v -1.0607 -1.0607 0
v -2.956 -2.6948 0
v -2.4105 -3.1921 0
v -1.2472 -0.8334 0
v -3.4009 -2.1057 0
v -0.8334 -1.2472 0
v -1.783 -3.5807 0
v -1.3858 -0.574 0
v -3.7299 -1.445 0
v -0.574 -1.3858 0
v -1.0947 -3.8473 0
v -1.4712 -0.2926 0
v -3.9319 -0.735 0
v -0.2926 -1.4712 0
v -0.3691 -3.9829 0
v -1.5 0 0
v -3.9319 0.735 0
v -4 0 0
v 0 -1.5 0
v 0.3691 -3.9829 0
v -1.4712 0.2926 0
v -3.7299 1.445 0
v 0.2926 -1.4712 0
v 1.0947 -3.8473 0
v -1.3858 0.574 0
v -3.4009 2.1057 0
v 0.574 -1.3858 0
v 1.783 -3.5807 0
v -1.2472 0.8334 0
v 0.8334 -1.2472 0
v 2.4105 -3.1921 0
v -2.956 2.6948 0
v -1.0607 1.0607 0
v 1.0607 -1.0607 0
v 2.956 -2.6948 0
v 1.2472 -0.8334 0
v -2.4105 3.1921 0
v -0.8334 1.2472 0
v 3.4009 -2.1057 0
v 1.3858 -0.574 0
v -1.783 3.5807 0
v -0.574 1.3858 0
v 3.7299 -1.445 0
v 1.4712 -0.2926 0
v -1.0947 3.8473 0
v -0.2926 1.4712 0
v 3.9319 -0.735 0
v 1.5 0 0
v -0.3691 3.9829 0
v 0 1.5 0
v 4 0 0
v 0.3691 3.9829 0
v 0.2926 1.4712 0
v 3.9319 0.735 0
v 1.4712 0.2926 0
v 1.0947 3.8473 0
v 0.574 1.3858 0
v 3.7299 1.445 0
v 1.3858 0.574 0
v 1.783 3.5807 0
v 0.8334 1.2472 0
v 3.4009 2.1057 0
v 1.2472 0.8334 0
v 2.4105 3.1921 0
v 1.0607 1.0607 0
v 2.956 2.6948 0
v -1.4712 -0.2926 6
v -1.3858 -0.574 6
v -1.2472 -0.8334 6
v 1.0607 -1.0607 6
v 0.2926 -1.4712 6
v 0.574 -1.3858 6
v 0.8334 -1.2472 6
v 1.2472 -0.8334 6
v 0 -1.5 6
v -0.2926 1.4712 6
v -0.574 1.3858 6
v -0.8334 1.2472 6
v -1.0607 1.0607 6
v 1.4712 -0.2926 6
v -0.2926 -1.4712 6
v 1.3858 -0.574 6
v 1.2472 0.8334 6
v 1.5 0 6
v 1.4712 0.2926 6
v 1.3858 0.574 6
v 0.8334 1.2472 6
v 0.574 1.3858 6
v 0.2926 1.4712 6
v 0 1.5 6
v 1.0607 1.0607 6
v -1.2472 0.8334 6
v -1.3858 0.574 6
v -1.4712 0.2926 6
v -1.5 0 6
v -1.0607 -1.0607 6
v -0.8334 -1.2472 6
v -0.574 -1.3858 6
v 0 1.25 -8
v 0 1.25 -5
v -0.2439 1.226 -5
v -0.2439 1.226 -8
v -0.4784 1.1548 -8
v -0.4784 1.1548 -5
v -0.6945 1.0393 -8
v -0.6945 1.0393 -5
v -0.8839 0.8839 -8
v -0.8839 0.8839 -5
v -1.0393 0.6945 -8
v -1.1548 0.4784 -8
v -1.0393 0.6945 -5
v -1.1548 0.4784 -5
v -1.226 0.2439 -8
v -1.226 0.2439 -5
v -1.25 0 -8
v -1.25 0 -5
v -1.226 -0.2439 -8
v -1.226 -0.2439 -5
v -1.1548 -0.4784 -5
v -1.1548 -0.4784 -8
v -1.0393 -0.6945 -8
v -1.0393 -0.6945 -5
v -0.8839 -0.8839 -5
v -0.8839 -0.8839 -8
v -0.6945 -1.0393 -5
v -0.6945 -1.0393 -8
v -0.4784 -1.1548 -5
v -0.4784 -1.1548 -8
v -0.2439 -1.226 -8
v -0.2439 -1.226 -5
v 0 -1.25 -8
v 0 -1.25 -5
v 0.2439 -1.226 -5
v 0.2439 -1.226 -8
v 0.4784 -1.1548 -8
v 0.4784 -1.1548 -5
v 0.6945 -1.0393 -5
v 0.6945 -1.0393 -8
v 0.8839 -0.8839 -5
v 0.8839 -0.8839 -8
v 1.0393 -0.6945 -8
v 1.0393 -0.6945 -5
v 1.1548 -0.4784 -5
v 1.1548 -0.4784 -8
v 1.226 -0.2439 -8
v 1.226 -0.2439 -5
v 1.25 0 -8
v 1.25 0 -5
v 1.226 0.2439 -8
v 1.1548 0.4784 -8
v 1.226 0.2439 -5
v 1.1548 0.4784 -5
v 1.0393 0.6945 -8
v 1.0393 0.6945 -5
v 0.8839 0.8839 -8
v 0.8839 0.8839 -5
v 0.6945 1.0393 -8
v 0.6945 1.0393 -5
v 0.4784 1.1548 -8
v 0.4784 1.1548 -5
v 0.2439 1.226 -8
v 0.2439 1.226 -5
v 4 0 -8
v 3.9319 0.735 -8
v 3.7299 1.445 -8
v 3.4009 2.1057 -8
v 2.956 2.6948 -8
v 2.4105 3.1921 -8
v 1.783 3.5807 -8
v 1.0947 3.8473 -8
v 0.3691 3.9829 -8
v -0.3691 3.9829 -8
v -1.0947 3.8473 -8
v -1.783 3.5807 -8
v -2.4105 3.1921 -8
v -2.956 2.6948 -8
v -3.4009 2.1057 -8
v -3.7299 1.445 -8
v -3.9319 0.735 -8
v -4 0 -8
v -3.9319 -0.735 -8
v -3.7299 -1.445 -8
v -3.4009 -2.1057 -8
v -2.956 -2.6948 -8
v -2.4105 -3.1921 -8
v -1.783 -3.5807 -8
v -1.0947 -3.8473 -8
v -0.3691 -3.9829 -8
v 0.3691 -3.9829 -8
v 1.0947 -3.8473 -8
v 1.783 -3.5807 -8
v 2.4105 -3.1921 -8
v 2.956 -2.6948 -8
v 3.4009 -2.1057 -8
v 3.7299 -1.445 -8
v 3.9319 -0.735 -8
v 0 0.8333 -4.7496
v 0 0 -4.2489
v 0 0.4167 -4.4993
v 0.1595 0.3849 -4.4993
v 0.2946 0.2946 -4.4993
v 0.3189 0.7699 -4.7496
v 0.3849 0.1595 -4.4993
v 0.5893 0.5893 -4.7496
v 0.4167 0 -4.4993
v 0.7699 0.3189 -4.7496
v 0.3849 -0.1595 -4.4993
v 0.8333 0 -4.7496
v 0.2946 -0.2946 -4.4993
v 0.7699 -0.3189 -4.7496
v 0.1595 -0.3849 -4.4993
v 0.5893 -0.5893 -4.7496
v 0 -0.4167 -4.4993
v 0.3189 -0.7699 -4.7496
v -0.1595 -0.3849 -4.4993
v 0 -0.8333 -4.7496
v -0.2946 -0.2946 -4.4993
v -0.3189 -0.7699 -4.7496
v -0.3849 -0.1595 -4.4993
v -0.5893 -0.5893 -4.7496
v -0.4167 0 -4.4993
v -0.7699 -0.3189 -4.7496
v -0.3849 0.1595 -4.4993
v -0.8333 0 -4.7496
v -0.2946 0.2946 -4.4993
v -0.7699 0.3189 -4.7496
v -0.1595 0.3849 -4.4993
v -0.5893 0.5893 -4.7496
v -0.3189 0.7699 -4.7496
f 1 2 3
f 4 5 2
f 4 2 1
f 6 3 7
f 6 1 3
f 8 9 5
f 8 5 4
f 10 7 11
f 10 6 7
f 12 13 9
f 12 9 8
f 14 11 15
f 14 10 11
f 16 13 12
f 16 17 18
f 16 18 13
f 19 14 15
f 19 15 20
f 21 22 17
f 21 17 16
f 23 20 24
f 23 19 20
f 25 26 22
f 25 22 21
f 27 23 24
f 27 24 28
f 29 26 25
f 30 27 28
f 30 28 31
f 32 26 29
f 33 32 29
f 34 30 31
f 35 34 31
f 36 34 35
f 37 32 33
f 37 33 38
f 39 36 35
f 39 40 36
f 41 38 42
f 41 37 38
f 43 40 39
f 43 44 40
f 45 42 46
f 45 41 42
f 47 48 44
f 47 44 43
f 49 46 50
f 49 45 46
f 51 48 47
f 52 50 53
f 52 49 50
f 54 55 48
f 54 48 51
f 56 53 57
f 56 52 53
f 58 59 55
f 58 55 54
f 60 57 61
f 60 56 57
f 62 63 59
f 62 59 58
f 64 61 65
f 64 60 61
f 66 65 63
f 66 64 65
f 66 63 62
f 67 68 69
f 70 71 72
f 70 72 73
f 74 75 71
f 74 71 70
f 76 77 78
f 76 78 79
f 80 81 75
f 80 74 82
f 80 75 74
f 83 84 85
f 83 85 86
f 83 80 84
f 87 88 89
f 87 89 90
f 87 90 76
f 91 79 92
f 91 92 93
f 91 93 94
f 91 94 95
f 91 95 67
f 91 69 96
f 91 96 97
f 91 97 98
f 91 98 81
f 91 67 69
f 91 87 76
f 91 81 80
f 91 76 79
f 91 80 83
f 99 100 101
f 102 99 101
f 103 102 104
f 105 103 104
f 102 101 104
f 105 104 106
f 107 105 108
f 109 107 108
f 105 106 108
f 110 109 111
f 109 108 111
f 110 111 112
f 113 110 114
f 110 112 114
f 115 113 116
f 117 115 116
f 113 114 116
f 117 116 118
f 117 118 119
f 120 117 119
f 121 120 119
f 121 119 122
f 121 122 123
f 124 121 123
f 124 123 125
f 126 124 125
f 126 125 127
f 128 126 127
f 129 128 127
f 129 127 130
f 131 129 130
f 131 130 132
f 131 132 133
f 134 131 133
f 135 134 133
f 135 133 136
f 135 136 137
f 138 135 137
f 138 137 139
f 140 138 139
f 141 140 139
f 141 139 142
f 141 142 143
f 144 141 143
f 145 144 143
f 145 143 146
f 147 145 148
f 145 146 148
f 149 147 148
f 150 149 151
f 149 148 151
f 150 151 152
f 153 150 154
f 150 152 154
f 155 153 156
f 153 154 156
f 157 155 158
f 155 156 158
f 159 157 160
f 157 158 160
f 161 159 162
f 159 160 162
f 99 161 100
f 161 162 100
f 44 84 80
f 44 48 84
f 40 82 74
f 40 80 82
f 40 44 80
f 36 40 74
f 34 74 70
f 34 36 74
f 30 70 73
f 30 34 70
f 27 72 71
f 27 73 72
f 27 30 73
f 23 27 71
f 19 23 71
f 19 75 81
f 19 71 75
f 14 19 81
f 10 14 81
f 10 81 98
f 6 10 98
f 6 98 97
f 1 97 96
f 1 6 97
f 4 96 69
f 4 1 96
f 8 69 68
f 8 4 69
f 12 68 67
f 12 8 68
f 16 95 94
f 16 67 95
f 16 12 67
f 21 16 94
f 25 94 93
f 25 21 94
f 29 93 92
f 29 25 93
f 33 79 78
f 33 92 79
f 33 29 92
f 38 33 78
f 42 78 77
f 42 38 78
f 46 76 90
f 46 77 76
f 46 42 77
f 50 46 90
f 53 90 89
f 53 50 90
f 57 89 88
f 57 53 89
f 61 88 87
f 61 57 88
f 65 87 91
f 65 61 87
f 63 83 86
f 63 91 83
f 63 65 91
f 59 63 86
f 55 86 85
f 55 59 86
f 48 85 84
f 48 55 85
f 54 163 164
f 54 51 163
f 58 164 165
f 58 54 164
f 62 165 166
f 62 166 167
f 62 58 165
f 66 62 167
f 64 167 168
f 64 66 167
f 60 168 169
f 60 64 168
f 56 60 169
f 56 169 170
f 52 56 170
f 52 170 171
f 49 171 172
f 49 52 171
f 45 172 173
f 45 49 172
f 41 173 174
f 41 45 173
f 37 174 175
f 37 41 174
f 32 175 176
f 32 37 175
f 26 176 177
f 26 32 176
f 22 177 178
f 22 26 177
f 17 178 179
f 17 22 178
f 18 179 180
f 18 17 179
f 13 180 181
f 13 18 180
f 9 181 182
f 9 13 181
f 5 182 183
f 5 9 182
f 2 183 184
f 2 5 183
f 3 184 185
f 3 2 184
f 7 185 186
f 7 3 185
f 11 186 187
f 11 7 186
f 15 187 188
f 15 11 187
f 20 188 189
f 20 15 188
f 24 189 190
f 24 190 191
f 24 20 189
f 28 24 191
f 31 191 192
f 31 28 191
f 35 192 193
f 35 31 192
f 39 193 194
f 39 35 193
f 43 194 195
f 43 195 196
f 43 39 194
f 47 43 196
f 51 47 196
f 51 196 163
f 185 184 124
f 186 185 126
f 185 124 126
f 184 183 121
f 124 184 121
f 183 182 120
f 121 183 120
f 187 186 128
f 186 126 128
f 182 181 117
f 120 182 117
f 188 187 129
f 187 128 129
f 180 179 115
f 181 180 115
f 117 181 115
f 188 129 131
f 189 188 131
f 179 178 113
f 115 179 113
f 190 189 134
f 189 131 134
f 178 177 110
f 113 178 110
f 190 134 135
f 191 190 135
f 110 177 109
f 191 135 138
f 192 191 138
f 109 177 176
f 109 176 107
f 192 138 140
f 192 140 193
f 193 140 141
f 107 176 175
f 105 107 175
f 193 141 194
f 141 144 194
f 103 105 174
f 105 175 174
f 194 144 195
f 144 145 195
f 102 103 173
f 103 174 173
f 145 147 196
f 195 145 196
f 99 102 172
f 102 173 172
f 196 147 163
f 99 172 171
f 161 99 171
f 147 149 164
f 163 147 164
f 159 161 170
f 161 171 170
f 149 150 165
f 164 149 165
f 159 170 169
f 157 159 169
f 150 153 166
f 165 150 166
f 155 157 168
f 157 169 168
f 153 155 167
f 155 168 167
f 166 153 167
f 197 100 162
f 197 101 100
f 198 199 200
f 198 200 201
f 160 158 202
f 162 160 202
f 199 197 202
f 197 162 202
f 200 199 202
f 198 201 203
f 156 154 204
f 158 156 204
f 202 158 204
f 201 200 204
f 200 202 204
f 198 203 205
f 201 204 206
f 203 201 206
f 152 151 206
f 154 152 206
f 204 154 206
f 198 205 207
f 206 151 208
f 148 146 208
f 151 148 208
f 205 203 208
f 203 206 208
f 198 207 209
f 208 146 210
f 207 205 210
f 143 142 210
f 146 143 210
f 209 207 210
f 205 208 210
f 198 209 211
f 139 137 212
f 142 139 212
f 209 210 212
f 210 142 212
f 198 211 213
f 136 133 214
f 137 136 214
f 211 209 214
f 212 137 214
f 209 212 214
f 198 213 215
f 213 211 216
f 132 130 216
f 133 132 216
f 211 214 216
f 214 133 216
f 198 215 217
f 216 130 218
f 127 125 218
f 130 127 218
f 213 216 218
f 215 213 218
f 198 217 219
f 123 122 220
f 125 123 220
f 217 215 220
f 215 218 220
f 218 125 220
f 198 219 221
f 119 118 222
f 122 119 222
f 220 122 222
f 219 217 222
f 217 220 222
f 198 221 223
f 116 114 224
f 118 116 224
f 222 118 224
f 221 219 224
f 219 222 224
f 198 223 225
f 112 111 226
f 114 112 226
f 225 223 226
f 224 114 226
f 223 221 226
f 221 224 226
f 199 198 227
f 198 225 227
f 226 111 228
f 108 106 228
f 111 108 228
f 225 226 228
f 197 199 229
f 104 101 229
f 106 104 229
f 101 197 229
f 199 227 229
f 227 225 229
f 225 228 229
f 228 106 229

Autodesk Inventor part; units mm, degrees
ref_plane "YZ Plane" through (0, 0, 0) normal (1, 0, 0) x (0, 1, 0)
ref_plane "XZ Plane" through (0, 0, 0) normal (0, 1, 0) x (-1, 0, 0)
ref_plane "XY Plane" through (0, 0, 0) normal (0, 0, 1) x (1, 0, 0)
sketch "スケッチ1" plane through (0, 0, 0) normal (0, 0, 1) x (1, 0, 0)
  circle A0 centre (0, 0) radius 4
  circle A1 centre (0, 0) radius 1.5
  dimension "d0" = 8
  dimension "d1" = 3
extrude "押し出し1" add sketch "スケッチ1" along normal blind 6 contours A1
extrude "押し出し2" add sketch "スケッチ1" against normal blind 8 contours A0 | A1
sketch "スケッチ2" plane through (0, 0, -8) normal (0, 0, -1) x (-1, 0, 0)
  circle A0 centre (0, 0) radius 4 projected
hole "穴1" at (0, 0, -8) direction (0, 0, 1) diameter 2.5 depth 3 tip angle 118
properties part number "防振ゴム雄ねじ雌ねじスペーサー"
